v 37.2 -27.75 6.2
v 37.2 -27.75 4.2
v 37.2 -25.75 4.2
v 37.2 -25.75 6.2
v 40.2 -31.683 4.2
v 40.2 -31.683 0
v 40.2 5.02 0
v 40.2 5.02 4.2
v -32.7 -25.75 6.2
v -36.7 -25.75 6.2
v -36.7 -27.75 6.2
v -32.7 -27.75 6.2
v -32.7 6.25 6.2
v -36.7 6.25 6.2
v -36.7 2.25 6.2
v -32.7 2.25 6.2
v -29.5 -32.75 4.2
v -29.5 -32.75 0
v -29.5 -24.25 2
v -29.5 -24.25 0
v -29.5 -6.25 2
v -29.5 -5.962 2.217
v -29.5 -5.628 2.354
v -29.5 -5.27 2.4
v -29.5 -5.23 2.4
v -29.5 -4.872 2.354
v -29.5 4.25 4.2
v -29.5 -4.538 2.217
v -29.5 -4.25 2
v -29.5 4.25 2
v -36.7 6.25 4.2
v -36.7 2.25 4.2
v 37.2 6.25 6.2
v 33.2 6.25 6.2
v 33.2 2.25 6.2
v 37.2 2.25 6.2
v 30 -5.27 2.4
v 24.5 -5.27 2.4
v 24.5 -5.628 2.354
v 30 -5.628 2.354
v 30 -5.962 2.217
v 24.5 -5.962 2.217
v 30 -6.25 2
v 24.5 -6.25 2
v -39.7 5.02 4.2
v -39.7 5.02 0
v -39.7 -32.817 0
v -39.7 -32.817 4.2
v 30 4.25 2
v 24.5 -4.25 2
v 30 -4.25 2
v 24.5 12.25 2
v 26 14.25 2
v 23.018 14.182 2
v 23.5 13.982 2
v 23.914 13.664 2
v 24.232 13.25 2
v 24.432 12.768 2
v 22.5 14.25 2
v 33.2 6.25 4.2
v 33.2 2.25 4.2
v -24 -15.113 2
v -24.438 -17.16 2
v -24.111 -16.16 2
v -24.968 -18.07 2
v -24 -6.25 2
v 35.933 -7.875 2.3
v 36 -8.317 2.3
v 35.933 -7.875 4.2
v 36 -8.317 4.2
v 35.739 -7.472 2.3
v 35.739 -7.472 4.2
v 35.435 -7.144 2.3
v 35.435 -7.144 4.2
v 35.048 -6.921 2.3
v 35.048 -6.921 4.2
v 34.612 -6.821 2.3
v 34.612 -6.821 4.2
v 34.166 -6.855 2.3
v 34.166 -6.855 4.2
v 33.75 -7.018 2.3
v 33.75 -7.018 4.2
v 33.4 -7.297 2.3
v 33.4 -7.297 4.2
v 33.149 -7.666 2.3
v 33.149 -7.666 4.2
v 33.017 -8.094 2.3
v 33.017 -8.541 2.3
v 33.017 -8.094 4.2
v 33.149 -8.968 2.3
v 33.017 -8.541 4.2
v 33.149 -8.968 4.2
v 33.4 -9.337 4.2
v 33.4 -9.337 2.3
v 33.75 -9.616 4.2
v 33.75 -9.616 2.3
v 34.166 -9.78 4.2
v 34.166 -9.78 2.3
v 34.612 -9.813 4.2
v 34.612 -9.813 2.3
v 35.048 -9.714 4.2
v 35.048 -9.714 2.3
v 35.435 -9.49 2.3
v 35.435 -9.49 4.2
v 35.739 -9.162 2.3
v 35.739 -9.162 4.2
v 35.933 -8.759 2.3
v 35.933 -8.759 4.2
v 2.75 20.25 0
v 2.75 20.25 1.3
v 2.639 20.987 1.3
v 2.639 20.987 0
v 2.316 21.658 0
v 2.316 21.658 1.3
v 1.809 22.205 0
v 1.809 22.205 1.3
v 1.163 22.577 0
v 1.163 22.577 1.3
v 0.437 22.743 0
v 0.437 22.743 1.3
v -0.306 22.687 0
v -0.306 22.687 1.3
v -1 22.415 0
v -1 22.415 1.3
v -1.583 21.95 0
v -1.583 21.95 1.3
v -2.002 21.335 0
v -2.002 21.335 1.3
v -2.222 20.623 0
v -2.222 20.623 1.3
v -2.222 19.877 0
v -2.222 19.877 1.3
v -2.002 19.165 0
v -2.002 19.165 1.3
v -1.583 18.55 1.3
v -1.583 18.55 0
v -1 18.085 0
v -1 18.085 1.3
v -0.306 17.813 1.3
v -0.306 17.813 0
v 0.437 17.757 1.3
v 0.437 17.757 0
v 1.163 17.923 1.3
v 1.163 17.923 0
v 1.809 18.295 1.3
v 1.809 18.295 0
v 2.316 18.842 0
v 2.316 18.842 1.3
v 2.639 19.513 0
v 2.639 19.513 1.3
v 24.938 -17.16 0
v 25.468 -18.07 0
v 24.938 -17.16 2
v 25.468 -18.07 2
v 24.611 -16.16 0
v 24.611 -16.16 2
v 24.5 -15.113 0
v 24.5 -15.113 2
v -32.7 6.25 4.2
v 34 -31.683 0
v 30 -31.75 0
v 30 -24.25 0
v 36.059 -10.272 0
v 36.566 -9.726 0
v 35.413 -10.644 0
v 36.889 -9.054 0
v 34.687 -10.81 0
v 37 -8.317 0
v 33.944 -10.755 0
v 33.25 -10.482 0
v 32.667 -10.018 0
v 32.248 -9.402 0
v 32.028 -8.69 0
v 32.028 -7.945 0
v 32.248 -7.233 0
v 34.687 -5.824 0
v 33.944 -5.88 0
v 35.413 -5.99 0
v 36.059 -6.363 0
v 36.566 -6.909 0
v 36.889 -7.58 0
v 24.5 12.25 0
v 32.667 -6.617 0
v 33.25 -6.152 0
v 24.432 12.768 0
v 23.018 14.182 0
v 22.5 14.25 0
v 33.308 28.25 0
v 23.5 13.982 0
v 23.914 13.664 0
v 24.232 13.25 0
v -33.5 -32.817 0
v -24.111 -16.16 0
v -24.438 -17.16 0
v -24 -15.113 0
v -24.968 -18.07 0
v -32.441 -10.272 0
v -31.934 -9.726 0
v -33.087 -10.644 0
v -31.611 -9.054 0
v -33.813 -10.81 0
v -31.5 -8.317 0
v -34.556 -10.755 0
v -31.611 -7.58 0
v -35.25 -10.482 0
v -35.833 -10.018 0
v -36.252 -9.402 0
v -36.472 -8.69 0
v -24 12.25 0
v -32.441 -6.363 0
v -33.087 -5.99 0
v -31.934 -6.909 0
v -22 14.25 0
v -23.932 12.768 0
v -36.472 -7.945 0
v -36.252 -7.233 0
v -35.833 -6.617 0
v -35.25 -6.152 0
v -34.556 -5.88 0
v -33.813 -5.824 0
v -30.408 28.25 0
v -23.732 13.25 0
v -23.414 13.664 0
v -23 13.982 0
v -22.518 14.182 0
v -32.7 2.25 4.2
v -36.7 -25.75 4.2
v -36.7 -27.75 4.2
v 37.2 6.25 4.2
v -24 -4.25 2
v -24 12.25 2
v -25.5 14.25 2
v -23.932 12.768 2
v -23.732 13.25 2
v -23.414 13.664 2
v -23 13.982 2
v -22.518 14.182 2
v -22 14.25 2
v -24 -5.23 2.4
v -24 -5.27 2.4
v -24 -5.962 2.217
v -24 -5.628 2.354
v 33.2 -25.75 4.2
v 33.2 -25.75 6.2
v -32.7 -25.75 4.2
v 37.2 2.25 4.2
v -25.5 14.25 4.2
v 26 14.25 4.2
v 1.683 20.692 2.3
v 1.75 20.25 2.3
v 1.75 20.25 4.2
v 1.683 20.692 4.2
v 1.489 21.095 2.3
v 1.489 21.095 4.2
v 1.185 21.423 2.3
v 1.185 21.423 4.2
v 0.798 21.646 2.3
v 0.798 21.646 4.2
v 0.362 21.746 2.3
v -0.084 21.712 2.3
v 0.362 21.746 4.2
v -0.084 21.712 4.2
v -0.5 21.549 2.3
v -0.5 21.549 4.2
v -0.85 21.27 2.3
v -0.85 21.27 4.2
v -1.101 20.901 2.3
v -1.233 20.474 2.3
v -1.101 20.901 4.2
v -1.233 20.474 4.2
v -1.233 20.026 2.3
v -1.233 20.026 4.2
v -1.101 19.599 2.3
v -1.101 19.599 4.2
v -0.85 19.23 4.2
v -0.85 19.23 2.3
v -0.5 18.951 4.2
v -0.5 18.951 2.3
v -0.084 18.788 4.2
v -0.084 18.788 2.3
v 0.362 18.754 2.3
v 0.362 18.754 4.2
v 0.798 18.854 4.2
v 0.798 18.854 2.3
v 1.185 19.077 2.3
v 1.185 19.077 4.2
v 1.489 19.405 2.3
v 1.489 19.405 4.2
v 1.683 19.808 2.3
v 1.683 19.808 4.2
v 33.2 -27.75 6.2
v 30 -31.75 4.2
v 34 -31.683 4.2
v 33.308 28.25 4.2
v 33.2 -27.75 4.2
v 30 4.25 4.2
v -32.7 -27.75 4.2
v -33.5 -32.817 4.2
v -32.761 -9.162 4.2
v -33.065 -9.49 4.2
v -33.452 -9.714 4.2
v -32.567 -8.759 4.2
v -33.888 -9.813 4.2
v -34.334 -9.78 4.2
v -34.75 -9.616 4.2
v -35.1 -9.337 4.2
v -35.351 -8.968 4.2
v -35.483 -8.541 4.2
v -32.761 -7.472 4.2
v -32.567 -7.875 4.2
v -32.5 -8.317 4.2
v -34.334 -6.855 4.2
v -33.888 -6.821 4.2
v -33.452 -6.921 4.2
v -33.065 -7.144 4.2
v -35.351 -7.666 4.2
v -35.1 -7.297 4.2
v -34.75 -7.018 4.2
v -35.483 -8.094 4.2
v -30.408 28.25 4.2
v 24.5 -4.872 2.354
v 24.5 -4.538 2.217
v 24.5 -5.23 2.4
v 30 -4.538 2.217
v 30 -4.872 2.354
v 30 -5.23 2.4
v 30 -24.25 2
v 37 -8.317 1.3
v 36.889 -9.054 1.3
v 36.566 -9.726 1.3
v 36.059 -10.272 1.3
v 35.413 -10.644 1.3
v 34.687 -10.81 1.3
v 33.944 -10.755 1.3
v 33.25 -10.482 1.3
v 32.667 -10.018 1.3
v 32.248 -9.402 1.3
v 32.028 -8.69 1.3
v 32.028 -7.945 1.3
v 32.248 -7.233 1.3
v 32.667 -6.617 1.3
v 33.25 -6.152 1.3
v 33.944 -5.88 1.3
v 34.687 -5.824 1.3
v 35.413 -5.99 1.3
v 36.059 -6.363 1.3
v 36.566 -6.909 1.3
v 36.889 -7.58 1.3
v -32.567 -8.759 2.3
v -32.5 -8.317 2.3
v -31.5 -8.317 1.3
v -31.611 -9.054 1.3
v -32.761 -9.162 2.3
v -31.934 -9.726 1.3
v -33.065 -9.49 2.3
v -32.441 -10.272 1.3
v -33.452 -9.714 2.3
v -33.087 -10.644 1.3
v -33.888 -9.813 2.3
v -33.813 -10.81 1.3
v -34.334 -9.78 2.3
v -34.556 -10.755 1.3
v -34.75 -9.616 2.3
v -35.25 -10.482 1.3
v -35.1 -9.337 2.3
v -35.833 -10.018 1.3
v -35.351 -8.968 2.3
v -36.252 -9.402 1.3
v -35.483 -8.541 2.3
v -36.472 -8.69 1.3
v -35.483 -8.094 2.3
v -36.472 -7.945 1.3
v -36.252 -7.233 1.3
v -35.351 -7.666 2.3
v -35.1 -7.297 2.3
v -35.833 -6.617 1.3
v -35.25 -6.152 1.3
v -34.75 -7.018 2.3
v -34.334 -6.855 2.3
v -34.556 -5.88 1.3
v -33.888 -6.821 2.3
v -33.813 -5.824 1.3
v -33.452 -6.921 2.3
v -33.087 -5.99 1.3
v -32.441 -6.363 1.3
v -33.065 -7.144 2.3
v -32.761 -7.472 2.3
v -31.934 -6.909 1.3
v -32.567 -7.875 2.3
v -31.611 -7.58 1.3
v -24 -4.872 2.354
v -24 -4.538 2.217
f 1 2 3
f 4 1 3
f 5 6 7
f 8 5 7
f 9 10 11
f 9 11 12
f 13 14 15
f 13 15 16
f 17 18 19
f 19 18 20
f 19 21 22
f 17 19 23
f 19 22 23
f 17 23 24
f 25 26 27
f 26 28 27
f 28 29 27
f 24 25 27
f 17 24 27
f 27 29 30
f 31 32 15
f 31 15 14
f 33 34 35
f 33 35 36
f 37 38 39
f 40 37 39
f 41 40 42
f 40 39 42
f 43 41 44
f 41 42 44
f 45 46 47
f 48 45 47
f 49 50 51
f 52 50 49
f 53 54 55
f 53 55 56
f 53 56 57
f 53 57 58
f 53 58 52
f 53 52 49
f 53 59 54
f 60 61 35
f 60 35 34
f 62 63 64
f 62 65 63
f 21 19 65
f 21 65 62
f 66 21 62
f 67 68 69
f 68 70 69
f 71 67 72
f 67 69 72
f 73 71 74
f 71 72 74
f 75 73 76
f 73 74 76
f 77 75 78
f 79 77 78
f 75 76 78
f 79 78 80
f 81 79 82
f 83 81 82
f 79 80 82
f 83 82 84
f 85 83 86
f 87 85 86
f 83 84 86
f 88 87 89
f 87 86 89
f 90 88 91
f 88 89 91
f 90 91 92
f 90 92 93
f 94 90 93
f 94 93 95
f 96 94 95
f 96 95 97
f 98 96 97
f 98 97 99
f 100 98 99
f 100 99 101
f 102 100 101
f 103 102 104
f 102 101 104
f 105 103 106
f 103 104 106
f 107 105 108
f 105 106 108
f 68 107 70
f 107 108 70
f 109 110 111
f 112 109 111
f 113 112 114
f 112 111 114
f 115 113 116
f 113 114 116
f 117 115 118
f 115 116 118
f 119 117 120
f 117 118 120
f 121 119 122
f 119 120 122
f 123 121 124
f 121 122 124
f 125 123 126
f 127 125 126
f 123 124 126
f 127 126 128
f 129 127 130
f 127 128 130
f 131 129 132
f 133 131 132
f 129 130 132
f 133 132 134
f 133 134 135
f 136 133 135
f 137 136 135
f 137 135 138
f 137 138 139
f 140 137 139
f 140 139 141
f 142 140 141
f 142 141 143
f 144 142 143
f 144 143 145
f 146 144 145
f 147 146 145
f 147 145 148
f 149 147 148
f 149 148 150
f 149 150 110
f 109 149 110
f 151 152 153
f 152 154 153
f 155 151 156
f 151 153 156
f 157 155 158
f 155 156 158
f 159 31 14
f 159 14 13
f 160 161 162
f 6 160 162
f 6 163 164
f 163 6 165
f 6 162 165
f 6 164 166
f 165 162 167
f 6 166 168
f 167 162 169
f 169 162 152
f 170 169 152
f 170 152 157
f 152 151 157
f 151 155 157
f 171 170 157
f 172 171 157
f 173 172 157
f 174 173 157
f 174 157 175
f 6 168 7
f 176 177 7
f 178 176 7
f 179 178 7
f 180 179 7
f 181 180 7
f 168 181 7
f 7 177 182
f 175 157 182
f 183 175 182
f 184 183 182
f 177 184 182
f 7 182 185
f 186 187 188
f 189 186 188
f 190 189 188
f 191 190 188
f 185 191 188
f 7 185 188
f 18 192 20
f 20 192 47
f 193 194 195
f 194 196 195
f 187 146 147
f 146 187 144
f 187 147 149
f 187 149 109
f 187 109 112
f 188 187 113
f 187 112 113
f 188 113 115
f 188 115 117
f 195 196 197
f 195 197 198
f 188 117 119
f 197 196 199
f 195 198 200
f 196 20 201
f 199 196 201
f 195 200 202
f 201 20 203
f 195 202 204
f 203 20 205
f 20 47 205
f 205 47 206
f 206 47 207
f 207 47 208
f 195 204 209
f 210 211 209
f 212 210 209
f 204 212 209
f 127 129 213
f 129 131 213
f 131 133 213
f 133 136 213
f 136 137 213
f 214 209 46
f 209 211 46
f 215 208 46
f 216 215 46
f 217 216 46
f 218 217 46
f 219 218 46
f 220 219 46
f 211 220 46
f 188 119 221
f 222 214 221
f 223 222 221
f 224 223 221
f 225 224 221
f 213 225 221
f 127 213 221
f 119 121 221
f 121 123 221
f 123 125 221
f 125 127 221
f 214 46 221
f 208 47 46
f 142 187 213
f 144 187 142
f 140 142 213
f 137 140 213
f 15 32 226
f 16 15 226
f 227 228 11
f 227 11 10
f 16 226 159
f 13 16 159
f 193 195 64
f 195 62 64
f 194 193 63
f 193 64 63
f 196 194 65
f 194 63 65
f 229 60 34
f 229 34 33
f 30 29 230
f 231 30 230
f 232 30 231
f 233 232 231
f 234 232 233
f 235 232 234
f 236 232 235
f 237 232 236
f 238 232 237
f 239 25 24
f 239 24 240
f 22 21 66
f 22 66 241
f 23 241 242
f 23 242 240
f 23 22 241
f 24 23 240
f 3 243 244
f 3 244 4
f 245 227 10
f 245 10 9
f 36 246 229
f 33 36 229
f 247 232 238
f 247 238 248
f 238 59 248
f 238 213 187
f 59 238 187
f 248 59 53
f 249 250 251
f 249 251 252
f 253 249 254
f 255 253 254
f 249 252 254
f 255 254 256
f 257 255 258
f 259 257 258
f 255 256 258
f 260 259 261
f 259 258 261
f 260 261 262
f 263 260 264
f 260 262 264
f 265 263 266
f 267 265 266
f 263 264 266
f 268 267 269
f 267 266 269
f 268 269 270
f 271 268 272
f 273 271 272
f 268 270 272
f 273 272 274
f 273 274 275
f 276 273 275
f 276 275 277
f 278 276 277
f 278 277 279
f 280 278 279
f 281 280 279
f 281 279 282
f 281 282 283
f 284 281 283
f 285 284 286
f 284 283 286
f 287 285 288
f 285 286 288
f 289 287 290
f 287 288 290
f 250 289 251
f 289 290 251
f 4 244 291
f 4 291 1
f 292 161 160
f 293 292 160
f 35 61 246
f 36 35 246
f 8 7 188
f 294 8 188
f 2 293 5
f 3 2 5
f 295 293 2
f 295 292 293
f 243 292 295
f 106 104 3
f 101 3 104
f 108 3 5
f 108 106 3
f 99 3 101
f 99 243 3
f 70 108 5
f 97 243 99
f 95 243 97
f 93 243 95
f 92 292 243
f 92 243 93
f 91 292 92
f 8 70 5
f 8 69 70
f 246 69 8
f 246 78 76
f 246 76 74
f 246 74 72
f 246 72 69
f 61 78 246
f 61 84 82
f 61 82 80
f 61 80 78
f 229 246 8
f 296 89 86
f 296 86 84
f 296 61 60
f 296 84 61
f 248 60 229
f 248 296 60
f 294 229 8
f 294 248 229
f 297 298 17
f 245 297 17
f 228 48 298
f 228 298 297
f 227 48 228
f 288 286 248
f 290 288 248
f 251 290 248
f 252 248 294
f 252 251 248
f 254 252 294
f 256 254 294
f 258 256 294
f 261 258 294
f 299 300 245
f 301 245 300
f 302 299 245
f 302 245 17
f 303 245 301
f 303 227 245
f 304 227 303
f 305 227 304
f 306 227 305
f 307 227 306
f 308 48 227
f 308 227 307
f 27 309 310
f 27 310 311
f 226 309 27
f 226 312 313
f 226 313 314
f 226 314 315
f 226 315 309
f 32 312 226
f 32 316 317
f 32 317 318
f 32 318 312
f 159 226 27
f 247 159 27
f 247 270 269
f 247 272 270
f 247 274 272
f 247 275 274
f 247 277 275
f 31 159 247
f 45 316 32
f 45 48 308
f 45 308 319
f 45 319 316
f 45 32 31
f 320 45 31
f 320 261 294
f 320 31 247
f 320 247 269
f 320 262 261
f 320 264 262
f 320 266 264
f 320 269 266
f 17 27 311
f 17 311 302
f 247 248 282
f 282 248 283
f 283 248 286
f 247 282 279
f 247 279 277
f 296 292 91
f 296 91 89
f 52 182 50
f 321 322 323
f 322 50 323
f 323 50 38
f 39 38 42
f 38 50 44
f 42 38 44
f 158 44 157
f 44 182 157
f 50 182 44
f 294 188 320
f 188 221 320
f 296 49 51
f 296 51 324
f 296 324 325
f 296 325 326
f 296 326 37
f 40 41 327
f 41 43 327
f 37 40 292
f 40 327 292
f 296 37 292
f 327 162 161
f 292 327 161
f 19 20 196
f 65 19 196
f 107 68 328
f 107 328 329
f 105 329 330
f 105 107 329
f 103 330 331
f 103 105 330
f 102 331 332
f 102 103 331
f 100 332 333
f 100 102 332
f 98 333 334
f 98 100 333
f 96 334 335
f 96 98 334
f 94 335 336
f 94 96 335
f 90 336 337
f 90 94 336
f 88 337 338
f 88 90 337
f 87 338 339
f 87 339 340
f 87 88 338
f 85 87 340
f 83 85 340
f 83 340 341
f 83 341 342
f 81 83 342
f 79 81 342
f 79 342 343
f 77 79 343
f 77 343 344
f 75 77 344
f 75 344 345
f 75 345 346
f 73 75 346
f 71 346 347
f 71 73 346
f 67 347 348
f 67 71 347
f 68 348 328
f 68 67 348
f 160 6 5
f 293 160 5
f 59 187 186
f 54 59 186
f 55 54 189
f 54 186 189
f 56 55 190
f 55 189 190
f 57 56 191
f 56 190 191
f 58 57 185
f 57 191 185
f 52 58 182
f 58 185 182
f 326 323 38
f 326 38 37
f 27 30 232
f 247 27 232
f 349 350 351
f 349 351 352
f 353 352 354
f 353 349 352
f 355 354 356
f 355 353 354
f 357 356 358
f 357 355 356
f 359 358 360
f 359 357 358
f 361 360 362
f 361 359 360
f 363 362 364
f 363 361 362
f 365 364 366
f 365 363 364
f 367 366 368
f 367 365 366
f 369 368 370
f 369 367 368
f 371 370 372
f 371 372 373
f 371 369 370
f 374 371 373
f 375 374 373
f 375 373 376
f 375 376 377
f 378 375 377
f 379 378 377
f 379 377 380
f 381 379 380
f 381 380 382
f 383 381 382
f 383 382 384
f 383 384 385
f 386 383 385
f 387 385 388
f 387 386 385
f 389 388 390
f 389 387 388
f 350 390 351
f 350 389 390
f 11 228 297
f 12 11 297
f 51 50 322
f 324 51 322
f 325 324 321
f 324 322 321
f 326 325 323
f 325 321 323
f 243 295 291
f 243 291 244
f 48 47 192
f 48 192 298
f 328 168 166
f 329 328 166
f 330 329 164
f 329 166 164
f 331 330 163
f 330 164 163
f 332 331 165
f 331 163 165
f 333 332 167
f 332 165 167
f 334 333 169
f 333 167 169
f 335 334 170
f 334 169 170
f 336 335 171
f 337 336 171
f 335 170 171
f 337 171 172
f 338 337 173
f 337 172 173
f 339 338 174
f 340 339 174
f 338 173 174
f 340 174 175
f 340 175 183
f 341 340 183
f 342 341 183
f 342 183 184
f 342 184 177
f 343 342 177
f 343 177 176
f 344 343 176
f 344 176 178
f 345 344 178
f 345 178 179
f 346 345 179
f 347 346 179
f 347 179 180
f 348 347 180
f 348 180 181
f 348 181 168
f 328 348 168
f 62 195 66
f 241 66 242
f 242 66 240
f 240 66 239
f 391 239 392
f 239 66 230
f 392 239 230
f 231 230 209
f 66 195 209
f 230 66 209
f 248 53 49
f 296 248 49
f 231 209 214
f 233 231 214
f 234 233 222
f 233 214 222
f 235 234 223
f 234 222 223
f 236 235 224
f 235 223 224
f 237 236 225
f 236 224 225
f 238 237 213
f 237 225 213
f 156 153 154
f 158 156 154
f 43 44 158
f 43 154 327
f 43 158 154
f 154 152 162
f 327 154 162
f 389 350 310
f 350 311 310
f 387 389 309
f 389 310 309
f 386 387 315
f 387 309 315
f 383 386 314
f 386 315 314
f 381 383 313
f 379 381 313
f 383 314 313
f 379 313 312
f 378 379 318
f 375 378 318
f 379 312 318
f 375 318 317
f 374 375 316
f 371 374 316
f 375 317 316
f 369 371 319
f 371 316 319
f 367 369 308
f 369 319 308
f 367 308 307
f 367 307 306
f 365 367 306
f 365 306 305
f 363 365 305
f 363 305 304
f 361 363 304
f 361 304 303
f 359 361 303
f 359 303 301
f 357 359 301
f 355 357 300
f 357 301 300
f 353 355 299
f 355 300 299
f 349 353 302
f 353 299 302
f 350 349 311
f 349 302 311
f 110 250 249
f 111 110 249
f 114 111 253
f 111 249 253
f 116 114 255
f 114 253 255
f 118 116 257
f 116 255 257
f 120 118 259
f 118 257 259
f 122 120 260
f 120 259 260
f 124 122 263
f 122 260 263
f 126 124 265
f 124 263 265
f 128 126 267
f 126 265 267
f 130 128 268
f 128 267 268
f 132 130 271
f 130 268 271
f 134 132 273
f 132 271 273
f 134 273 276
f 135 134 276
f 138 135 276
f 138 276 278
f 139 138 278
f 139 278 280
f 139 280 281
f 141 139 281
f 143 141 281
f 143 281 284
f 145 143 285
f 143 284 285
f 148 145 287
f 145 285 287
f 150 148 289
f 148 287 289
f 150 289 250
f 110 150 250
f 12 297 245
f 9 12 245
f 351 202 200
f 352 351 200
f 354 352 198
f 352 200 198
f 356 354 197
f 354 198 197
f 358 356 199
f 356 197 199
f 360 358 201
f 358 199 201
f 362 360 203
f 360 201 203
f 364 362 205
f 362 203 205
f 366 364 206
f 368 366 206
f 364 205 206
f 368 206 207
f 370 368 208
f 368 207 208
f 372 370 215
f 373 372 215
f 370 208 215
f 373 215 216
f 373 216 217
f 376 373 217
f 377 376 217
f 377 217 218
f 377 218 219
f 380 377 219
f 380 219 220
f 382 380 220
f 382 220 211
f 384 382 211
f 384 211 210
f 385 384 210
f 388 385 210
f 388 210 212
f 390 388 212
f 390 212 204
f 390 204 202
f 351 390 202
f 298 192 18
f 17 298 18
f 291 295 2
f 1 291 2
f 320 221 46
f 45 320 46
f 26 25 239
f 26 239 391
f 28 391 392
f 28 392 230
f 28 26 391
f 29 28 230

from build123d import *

# Parameters (mm, degrees)
F1_DEPTH      = 2
F2_DEPTH      = 4.2
F3_DEPTH      = 6.2
F4_DEPTH      = 6.2
F5_W          = 4
F5_H          = 2
F5_H_2        = 4
F6_DEPTH      = 2
F7_R          = 2.5
F7_R_2        = 1.5
F8_DEPTH      = 2.5
F9_DEPTH      = 4.5
F10_R         = 5
F12_START     = -1.7
F11_R         = 2.5
F11_R_2       = 1.5
F12_DEPTH     = 5.1
F13_DEPTH     = 4.2
F14_W         = 5.5
F14_H         = 2
F15_DEPTH     = 0.4
F16_T1_DEPTH  = 7.9494897428
F16_T3_DEPTH  = 7.9494897428
F17_S5_R      = 1.5
F17_T6_DEPTH  = 5
F17_S11_R     = 1.5
F17_T12_DEPTH = 5
F17_S17_R     = 1.5
F17_T18_DEPTH = 5


# Not quite as in the source:
# - a fillet or chamfer that OpenCascade refuses, or shapes differently, is made with other operations: its cross-section is extruded or revolved along the edge and cut away or added


with BuildPart() as f1:
    # F0 (on Top) → F1 (new body)
    with BuildSketch(Plane.XY):
        with BuildLine():
            Line((26, 14.25), (22.5, 14.25))
            ThreePointArc((22.5, 14.25), (23.9142135624, 13.6642135624), (24.5, 12.25))
            Line((24.5, 12.25), (24.5, -16.75))
            Line((24.5, -16.75), (30, -24.25))
            Line((30, -24.25), (30, 4.25))
            Line((30, 4.25), (26, 14.25))
        make_face()
    extrude(amount=F1_DEPTH)



with BuildPart() as f1b:
    # F0 (on Top) → F1, piece 2 (new body)
    with BuildSketch(Plane.XY):
        with BuildLine():
            Line((-22, 14.25), (-25.5, 14.25))
            Line((-25.5, 14.25), (-29.5, 4.25))
            Line((-29.5, 4.25), (-29.5, -24.25))
            Line((-29.5, -24.25), (-24, -16.75))
            Line((-24, -16.75), (-24, 12.25))
            ThreePointArc((-24, 12.25), (-23.4142135624, 13.6642135624), (-22, 14.25))
        make_face()
    extrude(amount=F1_DEPTH)


with BuildPart() as f1_1:
    add(f1.part)

    add(f1b.part)  # F2 merges F1b
    # F0 (on Top) → F2 (join)
    with BuildSketch(Plane.XY):
        Polygon((-29.5, 4.25), (-25.5, 14.25), (-22, 14.25), (22.5, 14.25), (26, 14.25), (30, 4.25), (30, -24.25), (30, -31.75), (34, -31.6827731092), (34, 5.0203296143), (27.1081318457, 28.25), (-24.2081318457, 28.25), (-33.5, 5.0203296143), (-33.5, -32.8172268908), (-29.5, -32.75), (-29.5, -24.25), align=None)
    extrude(amount=F2_DEPTH)

    # F3 (add): faces of the model
    f3_faces = [f1_1.faces().sort_by_distance(p)[0] for p in [
        (-33.5, -13.8984486382, 2.1),
        (-28.8540659229, 16.6351648071, 2.1),
    ]]
    extrude(f3_faces, amount=F3_DEPTH, dir=(-1, 0, 0))

    # F4 (add): faces of the model
    f4_faces = [f1_1.faces().sort_by_distance(p)[0] for p in [
        (34, -13.3312217475, 2.1),
        (30.5540659229, 16.6351648071, 2.1),
    ]]
    extrude(f4_faces, amount=F4_DEPTH, dir=(1, 0, 0))

    # F5 (on face) → F6 (join)
    with BuildSketch(Plane.XY.offset(4.2)):
        with Locations((-34.7, -26.75)):
            Rectangle(F5_W, F5_H)
        with Locations((35.2, -26.75)):
            Rectangle(F5_W, F5_H)
        with Locations((35.2, 4.25)):
            Rectangle(F5_W, F5_H_2)
        with Locations((-34.7, 4.25)):
            Rectangle(F5_W, F5_H_2)
    extrude(amount=F6_DEPTH)

    # F7 (on face) → F8 (cut)
    with BuildSketch(Plane(origin=(0, 0, 0), x_dir=(1, 0, 0), z_dir=(0, 0, -1))):
        with Locations((-34, 8.3172268908)):
            Circle(F7_R)
        with Locations((-34, 8.3172268908)):
            Circle(F7_R_2, mode=Mode.SUBTRACT)
        with Locations((34.5, 8.3172268908)):
            Circle(F7_R)
        with Locations((34.5, 8.3172268908)):
            Circle(F7_R_2, mode=Mode.SUBTRACT)
    extrude(amount=-F8_DEPTH, mode=Mode.SUBTRACT)

    # F9 (cut): faces of the model
    f9_faces = [f1_1.faces().sort_by_distance(p)[0] for p in [
        (-34, -8.3172268908, 0),
        (34.5, -8.3172268908, 0),
    ]]
    extrude(f9_faces, amount=-F9_DEPTH, mode=Mode.SUBTRACT)

    # F10
    f10_edges = [f1_1.edges().sort_by_distance(p)[0] for p in [
        (24.5, -16.75, 1),
        (-24, -16.75, 1),
    ]]
    fillet(f10_edges, radius=F10_R)

    # F11 (on face) → F12 (cut)
    with BuildSketch(Plane.XY.offset(4.2).offset(F12_START)):
        with Locations((0.25, 20.25)):
            Circle(F11_R)
        with Locations((0.25, 20.25)):
            Circle(F11_R_2, mode=Mode.SUBTRACT)
    extrude(amount=-F12_DEPTH, mode=Mode.SUBTRACT)

    # F11 (on face) → F13 (cut)
    with BuildSketch(Plane.XY.offset(4.2)):
        with Locations((0.25, 20.25)):
            Circle(F11_R_2)
    extrude(amount=-F13_DEPTH, mode=Mode.SUBTRACT)

    # F14 (on face) → F15 (join)
    with BuildSketch(Plane.XY.offset(2)):
        with Locations((27.25, -5.25)):
            Rectangle(F14_W, F14_H)
        with Locations((-26.75, -5.25)):
            Rectangle(F14_W, F14_H)
    extrude(amount=F15_DEPTH)

    # F16: fillet of radius 1.4 on 4 edges, made by hand

    # F16_s2 → F16_t1 (cut)
    with BuildSketch(Plane.YZ.offset(-29.5)):
        with BuildLine():
            ThreePointArc((-6.25, 2), (-5.7993543651, 2.2961481397), (-5.2702041029, 2.4))
            Line((-5.2702041029, 2.4), (-6.25, 2.4))
            Line((-6.25, 2.4), (-6.25, 2))
        make_face()
        with BuildLine():
            ThreePointArc((-5.2297958971, 2.4), (-4.7006456349, 2.2961481397), (-4.25, 2))
            Line((-4.25, 2), (-4.25, 2.4))
            Line((-4.25, 2.4), (-5.2297958971, 2.4))
        make_face()
    extrude(amount=F16_T1_DEPTH, mode=Mode.SUBTRACT)

    # F16_s4 → F16_t3 (cut)
    with BuildSketch(Plane.YZ.offset(22.0505102572)):
        with BuildLine():
            ThreePointArc((-4.25, 2), (-4.7006456349, 2.2961481397), (-5.2297958971, 2.4))
            Line((-5.2297958971, 2.4), (-4.25, 2.4))
            Line((-4.25, 2.4), (-4.25, 2))
        make_face()
        with BuildLine():
            ThreePointArc((-5.2702041029, 2.4), (-5.7993543651, 2.2961481397), (-6.25, 2))
            Line((-6.25, 2), (-6.25, 2.4))
            Line((-6.25, 2.4), (-5.2702041029, 2.4))
        make_face()
    extrude(amount=F16_T3_DEPTH, mode=Mode.SUBTRACT)

    # F17: chamfer of 1.2 on 3 edges, made by hand


with BuildPart() as f17_tool2:
    # F17_s3 → F17_t4 (revolve)
    with BuildSketch(Plane.XZ.offset(8.3172268908)):
        Polygon((-31.5, 1.3), (-32.7, 2.5), (-31.5, 2.5), align=None)
    revolve(axis=Axis((-34, -8.3172268908, 2.5), (0, 0, -1)))

    # F17_s5 → F17_t6 (cut, symmetric)
    with BuildSketch(Plane.XY.offset(1.9)):
        with Locations((-34, -8.3172268908)):
            Circle(F17_S5_R)
    extrude(amount=F17_T6_DEPTH, both=True, mode=Mode.SUBTRACT)


with BuildPart() as f1_2:
    add(f1_1.part)

    # F17_t1: union F17_tool2
    add(f17_tool2.part)


with BuildPart() as f17_tool8:
    # F17_s9 → F17_t10 (revolve)
    with BuildSketch(Plane.XZ.offset(8.3172268908)):
        Polygon((37, 1.3), (35.8, 2.5), (37, 2.5), align=None)
    revolve(axis=Axis((34.5, -8.3172268908, 2.5), (0, 0, -1)))

    # F17_s11 → F17_t12 (cut, symmetric)
    with BuildSketch(Plane.XY.offset(1.9)):
        with Locations((34.5, -8.3172268908)):
            Circle(F17_S11_R)
    extrude(amount=F17_T12_DEPTH, both=True, mode=Mode.SUBTRACT)


with BuildPart() as f1_3:
    add(f1_2.part)

    # F17_t7: union F17_tool8
    add(f17_tool8.part)


with BuildPart() as f17_tool14:
    # F17_s15 → F17_t16 (revolve)
    with BuildSketch(Plane.XZ.offset(-20.25)):
        Polygon((2.75, 1.3), (1.55, 2.5), (2.75, 2.5), align=None)
    revolve(axis=Axis((0.25, 20.25, 2.5), (0, 0, 1)))

    # F17_s17 → F17_t18 (cut, symmetric)
    with BuildSketch(Plane.XY.offset(1.9)):
        with Locations((0.25, 20.25)):
            Circle(F17_S17_R)
    extrude(amount=F17_T18_DEPTH, both=True, mode=Mode.SUBTRACT)


with BuildPart() as f1_4:
    add(f1_3.part)

    # F17_t13: union F17_tool14
    add(f17_tool14.part)


solid = f1_4.part
